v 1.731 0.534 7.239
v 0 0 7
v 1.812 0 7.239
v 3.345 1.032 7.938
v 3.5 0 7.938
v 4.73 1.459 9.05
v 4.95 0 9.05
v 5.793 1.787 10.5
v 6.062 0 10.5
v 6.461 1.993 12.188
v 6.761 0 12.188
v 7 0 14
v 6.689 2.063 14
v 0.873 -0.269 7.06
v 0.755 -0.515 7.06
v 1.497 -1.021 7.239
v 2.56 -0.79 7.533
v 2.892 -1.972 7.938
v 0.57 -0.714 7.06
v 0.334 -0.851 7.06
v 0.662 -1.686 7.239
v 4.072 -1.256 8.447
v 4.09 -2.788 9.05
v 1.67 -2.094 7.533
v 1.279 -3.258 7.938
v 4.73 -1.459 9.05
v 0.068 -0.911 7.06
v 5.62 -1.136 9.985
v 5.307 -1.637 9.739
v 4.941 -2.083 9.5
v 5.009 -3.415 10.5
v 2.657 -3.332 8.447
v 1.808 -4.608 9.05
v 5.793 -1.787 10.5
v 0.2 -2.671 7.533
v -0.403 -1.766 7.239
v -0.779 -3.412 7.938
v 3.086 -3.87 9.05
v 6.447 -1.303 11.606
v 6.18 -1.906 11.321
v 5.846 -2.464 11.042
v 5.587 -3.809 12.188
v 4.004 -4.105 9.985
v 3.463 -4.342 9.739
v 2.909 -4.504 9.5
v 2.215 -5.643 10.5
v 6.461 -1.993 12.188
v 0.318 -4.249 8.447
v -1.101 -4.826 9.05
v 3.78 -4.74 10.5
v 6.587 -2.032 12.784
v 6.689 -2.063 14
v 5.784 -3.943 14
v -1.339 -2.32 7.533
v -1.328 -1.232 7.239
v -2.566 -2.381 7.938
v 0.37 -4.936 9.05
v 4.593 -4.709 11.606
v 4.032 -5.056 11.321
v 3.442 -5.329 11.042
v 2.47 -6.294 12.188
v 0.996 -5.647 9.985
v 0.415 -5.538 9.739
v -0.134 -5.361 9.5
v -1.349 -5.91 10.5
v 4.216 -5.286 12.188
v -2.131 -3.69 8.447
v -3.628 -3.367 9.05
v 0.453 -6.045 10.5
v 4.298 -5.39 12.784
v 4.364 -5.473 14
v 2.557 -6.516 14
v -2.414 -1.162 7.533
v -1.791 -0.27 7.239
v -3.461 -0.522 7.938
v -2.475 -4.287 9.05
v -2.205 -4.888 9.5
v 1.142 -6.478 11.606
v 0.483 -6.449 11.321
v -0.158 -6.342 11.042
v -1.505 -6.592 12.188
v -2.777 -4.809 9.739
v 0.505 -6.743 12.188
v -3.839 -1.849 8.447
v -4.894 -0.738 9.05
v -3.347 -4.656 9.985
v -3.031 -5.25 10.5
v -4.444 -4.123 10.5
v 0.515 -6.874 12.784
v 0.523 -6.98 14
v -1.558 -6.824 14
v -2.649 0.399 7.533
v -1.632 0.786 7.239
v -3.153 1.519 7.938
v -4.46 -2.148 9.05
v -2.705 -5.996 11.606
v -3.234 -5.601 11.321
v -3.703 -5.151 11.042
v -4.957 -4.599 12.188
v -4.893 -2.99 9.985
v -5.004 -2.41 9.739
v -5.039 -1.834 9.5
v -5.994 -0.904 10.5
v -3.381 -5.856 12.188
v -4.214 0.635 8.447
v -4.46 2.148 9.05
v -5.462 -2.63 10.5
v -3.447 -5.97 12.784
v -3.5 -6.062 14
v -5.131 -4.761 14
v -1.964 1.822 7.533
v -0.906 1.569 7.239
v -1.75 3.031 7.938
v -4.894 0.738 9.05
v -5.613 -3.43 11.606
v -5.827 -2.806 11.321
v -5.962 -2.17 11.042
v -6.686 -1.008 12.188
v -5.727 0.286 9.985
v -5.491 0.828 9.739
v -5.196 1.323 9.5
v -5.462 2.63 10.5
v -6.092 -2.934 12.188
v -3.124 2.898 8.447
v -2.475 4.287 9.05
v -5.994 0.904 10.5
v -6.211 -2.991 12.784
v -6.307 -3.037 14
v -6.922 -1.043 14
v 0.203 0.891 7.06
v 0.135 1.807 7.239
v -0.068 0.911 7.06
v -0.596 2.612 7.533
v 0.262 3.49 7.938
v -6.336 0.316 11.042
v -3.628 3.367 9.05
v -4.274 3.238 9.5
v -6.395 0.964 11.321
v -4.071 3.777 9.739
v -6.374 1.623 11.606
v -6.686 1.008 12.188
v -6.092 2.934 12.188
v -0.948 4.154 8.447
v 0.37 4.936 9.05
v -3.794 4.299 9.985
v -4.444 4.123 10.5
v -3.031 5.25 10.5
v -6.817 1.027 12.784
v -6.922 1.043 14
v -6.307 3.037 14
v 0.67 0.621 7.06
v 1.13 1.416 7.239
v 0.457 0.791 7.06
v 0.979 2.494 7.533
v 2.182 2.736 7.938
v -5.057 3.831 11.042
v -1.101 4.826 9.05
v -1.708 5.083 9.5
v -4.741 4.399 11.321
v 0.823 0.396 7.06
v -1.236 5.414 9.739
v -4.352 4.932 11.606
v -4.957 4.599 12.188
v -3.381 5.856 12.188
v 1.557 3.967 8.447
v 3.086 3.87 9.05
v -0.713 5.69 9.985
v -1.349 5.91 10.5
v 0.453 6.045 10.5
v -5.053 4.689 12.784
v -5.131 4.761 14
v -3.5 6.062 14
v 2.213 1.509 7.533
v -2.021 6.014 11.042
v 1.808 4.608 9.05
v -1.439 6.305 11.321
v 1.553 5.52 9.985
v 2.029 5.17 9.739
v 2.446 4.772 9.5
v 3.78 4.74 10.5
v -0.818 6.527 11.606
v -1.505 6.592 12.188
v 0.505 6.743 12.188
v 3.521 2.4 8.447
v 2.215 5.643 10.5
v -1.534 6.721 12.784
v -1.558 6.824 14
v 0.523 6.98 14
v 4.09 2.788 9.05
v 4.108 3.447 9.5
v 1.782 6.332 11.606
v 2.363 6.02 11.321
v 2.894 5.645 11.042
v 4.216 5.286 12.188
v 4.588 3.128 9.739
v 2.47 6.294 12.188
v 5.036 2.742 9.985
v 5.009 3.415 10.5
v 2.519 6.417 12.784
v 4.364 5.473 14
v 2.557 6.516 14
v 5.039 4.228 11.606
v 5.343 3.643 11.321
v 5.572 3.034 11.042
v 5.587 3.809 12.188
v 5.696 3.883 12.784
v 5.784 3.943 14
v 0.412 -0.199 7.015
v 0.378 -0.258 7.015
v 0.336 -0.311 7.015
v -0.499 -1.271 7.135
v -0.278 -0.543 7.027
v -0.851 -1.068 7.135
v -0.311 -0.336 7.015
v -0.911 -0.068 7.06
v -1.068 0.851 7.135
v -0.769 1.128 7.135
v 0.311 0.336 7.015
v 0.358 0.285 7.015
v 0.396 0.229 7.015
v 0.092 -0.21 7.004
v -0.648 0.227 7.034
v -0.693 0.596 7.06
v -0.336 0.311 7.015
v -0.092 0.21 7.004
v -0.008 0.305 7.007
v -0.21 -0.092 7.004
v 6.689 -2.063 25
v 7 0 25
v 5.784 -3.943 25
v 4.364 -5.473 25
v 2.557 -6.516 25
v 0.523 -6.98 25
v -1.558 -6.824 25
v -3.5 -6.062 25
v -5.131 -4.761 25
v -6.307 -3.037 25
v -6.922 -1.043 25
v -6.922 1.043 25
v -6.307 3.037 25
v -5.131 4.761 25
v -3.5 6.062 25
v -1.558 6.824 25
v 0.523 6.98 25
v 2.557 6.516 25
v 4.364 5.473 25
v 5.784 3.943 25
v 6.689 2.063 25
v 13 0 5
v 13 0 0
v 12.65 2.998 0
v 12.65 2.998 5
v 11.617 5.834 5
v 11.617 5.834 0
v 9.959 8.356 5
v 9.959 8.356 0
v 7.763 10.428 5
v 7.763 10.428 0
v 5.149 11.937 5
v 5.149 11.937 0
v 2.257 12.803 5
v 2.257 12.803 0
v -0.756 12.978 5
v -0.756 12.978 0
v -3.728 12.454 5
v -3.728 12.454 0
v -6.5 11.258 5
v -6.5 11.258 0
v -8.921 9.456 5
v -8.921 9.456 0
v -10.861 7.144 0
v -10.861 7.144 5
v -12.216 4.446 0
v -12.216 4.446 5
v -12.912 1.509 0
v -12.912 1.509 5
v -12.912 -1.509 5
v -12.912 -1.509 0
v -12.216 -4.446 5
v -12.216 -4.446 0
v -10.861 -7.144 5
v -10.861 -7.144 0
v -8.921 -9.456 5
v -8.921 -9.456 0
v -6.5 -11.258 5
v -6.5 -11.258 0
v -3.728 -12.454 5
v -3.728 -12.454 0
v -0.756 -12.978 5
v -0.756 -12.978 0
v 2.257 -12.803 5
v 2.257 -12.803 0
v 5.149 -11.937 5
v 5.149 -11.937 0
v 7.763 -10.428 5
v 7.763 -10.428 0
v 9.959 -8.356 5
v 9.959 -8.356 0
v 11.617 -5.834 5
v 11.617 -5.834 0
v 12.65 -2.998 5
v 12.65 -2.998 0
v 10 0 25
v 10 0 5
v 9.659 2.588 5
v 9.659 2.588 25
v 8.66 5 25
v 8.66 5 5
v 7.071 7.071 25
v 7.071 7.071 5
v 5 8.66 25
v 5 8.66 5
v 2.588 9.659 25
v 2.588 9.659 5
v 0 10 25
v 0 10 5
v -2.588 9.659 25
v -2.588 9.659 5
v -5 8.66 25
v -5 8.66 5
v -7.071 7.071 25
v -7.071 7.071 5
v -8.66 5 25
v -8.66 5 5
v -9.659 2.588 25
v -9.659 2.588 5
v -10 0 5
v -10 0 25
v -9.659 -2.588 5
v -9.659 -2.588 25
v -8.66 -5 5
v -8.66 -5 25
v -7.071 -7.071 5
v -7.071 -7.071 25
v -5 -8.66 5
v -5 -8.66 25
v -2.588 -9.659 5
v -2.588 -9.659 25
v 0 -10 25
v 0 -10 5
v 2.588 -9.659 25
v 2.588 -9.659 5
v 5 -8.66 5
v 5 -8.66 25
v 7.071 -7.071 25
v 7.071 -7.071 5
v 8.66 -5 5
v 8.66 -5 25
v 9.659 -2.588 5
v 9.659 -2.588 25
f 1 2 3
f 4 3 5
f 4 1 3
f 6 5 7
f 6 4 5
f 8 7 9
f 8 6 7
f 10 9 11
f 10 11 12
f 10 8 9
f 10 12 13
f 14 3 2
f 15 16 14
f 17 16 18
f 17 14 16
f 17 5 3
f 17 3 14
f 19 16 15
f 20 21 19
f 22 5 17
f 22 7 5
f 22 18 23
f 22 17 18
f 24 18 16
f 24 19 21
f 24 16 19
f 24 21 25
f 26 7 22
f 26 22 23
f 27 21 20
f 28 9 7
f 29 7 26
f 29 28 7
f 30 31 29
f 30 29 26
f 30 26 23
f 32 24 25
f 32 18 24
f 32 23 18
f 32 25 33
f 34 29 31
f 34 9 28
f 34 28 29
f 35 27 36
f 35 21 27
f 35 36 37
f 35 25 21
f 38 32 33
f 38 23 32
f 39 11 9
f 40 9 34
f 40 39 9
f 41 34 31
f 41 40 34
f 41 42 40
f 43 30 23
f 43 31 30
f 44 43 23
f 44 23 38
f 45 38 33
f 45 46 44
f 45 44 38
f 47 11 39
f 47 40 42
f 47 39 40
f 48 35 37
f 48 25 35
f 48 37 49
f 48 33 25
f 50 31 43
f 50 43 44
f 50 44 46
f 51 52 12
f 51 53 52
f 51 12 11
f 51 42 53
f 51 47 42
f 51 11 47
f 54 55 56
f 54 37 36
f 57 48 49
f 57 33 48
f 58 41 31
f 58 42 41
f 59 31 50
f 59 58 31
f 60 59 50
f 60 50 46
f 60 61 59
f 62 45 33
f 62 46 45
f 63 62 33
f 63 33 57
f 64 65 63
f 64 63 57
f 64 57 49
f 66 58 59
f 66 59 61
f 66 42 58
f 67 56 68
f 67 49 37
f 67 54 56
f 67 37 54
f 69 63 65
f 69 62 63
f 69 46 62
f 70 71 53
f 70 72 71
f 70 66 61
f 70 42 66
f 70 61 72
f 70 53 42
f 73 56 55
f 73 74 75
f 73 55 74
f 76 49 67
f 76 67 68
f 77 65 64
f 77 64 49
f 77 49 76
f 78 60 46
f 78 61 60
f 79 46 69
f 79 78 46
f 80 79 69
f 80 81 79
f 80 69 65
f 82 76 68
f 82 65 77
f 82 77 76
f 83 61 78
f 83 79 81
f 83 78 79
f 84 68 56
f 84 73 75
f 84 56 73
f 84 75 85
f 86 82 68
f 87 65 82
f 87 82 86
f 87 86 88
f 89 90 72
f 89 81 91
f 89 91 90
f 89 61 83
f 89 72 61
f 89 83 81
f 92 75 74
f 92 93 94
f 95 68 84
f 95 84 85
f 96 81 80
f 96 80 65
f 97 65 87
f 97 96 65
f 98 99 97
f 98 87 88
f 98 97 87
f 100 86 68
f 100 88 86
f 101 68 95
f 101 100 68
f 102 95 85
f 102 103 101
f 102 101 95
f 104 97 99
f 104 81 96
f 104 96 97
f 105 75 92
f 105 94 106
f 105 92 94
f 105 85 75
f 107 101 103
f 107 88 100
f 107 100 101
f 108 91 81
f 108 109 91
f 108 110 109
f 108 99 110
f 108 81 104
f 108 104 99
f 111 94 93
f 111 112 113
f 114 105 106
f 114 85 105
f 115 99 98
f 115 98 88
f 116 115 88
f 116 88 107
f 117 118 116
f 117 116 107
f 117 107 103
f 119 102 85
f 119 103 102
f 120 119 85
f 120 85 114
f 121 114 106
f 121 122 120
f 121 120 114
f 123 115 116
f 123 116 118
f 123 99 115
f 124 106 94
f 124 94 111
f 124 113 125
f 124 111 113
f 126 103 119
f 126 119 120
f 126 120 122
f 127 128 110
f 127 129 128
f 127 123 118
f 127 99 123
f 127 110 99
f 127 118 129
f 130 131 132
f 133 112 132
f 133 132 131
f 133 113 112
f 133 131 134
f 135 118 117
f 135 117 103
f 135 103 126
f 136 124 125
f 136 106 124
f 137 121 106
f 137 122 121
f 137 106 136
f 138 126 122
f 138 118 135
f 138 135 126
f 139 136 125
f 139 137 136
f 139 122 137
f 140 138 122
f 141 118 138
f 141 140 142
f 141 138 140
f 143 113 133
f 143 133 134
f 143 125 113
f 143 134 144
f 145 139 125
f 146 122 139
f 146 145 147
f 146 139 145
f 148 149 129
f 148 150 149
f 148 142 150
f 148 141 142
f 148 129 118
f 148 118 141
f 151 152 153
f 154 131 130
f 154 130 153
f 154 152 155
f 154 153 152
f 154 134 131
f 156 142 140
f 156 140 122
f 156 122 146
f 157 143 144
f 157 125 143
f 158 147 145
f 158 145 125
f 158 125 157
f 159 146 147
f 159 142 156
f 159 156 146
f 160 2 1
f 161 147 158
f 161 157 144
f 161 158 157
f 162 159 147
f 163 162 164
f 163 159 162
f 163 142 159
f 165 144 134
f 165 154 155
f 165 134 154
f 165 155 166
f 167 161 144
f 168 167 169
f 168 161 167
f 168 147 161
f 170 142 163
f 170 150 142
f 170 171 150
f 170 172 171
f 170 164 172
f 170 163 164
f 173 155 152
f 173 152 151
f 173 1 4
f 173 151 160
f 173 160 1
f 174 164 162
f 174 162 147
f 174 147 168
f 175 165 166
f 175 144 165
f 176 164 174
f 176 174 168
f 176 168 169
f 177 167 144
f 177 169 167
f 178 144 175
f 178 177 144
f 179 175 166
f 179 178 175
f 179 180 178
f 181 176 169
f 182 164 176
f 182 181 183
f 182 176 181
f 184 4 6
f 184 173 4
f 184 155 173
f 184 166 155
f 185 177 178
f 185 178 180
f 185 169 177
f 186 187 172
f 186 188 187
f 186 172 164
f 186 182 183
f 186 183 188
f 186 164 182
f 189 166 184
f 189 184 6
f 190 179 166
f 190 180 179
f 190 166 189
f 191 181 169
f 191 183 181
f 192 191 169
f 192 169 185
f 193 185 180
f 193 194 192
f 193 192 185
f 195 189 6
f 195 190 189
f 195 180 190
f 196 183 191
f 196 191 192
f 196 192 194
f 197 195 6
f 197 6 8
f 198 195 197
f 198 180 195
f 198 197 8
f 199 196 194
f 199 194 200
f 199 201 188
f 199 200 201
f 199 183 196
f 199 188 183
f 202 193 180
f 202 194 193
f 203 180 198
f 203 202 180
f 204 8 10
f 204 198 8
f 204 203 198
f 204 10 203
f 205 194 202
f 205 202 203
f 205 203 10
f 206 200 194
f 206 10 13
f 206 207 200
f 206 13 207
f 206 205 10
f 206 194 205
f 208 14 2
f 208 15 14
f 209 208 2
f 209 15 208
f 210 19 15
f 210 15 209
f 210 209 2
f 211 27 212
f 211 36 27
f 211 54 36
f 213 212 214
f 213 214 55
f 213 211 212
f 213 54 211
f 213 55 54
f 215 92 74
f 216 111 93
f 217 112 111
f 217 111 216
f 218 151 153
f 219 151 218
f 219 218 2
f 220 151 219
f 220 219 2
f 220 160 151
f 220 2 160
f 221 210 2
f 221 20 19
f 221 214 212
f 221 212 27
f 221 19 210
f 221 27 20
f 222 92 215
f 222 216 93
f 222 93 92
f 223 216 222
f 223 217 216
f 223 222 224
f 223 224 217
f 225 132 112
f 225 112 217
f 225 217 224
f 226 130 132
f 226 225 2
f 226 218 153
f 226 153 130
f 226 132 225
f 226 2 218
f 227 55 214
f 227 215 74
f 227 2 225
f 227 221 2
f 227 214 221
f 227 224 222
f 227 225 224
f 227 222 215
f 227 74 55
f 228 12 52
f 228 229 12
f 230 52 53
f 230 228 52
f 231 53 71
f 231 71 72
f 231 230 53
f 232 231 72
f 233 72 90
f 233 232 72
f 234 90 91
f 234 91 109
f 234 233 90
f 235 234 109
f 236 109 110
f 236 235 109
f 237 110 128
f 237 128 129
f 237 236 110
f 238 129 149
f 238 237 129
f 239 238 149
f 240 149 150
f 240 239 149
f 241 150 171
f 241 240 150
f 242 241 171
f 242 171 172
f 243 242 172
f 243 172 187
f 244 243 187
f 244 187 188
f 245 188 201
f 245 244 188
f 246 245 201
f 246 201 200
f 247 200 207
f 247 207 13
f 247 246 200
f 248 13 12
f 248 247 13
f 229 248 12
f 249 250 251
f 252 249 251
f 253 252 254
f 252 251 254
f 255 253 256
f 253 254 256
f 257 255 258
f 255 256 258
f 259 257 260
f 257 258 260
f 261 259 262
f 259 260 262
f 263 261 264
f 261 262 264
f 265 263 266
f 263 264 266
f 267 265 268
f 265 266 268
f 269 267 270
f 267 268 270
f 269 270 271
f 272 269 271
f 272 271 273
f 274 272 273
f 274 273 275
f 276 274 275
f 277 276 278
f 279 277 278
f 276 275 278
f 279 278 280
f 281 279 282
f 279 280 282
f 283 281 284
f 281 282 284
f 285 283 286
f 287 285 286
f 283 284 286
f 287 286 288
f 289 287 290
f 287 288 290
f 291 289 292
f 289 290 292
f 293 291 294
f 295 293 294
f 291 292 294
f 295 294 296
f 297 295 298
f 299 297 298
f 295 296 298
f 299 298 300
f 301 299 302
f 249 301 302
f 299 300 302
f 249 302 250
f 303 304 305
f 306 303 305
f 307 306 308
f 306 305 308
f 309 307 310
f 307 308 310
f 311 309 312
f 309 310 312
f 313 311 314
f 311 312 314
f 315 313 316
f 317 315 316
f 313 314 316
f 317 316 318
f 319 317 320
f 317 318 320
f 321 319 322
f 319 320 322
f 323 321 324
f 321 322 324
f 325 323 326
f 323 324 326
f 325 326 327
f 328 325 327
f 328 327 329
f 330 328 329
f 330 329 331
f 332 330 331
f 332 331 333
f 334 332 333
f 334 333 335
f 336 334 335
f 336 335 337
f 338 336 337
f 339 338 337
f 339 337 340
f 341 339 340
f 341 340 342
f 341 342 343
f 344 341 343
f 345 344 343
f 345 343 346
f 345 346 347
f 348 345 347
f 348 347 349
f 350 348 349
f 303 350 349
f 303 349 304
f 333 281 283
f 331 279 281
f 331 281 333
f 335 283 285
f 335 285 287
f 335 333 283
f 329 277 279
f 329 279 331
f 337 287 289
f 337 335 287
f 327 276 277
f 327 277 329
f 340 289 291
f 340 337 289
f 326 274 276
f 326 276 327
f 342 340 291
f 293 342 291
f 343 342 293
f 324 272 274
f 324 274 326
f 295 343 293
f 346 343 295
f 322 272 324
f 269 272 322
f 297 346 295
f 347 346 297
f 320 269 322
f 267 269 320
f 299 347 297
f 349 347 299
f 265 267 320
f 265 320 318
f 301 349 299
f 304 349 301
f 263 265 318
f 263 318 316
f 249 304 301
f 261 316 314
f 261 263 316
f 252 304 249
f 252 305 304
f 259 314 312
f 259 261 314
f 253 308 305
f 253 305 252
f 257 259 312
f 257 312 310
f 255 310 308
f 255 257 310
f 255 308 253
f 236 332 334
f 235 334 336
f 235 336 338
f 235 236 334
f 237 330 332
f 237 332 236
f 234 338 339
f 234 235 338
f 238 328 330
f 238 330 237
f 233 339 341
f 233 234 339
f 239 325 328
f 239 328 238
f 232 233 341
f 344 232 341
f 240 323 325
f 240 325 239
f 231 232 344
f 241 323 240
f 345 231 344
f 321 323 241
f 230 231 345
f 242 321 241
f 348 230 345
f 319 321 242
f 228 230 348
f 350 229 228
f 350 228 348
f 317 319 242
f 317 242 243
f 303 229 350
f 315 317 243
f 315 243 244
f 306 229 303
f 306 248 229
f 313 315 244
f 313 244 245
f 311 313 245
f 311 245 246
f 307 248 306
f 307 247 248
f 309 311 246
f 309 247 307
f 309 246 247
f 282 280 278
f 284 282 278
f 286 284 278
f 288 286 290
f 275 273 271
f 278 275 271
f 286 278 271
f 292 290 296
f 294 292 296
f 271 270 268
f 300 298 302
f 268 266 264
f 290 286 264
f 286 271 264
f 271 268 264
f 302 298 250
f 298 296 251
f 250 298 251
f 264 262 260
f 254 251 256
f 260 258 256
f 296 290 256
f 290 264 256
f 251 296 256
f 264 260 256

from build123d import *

# Parameters (mm, degrees)
F0_R     = 10
F0_R_2   = 13
F1_DEPTH = 5
F2_DEPTH = 25


with BuildPart() as f1:
    # F0 (on Top) → F1 (new body)
    with BuildSketch(Plane.XY):
        Circle(F0_R)
        Circle(F0_R_2)
        Circle(F0_R, mode=Mode.SUBTRACT)
    extrude(amount=F1_DEPTH)

    # F0 (on Top) → F2 (join)
    with BuildSketch(Plane.XY):
        Circle(F0_R)
    extrude(amount=F2_DEPTH)

    # F3 (on Front) → F4 (revolve, cut)
    with BuildSketch(Plane.XZ):
        with BuildLine():
            Line((7, 25), (0, 25))
            Line((0, 25), (0, 7))
            ThreePointArc((0, 7), (4.949747, 9.050253), (7, 14))
            Line((7, 14), (7, 25))
        make_face()
    revolve(axis=Axis((0, 0, 16), (0, 0, -1)), mode=Mode.SUBTRACT)


solid = f1.part
